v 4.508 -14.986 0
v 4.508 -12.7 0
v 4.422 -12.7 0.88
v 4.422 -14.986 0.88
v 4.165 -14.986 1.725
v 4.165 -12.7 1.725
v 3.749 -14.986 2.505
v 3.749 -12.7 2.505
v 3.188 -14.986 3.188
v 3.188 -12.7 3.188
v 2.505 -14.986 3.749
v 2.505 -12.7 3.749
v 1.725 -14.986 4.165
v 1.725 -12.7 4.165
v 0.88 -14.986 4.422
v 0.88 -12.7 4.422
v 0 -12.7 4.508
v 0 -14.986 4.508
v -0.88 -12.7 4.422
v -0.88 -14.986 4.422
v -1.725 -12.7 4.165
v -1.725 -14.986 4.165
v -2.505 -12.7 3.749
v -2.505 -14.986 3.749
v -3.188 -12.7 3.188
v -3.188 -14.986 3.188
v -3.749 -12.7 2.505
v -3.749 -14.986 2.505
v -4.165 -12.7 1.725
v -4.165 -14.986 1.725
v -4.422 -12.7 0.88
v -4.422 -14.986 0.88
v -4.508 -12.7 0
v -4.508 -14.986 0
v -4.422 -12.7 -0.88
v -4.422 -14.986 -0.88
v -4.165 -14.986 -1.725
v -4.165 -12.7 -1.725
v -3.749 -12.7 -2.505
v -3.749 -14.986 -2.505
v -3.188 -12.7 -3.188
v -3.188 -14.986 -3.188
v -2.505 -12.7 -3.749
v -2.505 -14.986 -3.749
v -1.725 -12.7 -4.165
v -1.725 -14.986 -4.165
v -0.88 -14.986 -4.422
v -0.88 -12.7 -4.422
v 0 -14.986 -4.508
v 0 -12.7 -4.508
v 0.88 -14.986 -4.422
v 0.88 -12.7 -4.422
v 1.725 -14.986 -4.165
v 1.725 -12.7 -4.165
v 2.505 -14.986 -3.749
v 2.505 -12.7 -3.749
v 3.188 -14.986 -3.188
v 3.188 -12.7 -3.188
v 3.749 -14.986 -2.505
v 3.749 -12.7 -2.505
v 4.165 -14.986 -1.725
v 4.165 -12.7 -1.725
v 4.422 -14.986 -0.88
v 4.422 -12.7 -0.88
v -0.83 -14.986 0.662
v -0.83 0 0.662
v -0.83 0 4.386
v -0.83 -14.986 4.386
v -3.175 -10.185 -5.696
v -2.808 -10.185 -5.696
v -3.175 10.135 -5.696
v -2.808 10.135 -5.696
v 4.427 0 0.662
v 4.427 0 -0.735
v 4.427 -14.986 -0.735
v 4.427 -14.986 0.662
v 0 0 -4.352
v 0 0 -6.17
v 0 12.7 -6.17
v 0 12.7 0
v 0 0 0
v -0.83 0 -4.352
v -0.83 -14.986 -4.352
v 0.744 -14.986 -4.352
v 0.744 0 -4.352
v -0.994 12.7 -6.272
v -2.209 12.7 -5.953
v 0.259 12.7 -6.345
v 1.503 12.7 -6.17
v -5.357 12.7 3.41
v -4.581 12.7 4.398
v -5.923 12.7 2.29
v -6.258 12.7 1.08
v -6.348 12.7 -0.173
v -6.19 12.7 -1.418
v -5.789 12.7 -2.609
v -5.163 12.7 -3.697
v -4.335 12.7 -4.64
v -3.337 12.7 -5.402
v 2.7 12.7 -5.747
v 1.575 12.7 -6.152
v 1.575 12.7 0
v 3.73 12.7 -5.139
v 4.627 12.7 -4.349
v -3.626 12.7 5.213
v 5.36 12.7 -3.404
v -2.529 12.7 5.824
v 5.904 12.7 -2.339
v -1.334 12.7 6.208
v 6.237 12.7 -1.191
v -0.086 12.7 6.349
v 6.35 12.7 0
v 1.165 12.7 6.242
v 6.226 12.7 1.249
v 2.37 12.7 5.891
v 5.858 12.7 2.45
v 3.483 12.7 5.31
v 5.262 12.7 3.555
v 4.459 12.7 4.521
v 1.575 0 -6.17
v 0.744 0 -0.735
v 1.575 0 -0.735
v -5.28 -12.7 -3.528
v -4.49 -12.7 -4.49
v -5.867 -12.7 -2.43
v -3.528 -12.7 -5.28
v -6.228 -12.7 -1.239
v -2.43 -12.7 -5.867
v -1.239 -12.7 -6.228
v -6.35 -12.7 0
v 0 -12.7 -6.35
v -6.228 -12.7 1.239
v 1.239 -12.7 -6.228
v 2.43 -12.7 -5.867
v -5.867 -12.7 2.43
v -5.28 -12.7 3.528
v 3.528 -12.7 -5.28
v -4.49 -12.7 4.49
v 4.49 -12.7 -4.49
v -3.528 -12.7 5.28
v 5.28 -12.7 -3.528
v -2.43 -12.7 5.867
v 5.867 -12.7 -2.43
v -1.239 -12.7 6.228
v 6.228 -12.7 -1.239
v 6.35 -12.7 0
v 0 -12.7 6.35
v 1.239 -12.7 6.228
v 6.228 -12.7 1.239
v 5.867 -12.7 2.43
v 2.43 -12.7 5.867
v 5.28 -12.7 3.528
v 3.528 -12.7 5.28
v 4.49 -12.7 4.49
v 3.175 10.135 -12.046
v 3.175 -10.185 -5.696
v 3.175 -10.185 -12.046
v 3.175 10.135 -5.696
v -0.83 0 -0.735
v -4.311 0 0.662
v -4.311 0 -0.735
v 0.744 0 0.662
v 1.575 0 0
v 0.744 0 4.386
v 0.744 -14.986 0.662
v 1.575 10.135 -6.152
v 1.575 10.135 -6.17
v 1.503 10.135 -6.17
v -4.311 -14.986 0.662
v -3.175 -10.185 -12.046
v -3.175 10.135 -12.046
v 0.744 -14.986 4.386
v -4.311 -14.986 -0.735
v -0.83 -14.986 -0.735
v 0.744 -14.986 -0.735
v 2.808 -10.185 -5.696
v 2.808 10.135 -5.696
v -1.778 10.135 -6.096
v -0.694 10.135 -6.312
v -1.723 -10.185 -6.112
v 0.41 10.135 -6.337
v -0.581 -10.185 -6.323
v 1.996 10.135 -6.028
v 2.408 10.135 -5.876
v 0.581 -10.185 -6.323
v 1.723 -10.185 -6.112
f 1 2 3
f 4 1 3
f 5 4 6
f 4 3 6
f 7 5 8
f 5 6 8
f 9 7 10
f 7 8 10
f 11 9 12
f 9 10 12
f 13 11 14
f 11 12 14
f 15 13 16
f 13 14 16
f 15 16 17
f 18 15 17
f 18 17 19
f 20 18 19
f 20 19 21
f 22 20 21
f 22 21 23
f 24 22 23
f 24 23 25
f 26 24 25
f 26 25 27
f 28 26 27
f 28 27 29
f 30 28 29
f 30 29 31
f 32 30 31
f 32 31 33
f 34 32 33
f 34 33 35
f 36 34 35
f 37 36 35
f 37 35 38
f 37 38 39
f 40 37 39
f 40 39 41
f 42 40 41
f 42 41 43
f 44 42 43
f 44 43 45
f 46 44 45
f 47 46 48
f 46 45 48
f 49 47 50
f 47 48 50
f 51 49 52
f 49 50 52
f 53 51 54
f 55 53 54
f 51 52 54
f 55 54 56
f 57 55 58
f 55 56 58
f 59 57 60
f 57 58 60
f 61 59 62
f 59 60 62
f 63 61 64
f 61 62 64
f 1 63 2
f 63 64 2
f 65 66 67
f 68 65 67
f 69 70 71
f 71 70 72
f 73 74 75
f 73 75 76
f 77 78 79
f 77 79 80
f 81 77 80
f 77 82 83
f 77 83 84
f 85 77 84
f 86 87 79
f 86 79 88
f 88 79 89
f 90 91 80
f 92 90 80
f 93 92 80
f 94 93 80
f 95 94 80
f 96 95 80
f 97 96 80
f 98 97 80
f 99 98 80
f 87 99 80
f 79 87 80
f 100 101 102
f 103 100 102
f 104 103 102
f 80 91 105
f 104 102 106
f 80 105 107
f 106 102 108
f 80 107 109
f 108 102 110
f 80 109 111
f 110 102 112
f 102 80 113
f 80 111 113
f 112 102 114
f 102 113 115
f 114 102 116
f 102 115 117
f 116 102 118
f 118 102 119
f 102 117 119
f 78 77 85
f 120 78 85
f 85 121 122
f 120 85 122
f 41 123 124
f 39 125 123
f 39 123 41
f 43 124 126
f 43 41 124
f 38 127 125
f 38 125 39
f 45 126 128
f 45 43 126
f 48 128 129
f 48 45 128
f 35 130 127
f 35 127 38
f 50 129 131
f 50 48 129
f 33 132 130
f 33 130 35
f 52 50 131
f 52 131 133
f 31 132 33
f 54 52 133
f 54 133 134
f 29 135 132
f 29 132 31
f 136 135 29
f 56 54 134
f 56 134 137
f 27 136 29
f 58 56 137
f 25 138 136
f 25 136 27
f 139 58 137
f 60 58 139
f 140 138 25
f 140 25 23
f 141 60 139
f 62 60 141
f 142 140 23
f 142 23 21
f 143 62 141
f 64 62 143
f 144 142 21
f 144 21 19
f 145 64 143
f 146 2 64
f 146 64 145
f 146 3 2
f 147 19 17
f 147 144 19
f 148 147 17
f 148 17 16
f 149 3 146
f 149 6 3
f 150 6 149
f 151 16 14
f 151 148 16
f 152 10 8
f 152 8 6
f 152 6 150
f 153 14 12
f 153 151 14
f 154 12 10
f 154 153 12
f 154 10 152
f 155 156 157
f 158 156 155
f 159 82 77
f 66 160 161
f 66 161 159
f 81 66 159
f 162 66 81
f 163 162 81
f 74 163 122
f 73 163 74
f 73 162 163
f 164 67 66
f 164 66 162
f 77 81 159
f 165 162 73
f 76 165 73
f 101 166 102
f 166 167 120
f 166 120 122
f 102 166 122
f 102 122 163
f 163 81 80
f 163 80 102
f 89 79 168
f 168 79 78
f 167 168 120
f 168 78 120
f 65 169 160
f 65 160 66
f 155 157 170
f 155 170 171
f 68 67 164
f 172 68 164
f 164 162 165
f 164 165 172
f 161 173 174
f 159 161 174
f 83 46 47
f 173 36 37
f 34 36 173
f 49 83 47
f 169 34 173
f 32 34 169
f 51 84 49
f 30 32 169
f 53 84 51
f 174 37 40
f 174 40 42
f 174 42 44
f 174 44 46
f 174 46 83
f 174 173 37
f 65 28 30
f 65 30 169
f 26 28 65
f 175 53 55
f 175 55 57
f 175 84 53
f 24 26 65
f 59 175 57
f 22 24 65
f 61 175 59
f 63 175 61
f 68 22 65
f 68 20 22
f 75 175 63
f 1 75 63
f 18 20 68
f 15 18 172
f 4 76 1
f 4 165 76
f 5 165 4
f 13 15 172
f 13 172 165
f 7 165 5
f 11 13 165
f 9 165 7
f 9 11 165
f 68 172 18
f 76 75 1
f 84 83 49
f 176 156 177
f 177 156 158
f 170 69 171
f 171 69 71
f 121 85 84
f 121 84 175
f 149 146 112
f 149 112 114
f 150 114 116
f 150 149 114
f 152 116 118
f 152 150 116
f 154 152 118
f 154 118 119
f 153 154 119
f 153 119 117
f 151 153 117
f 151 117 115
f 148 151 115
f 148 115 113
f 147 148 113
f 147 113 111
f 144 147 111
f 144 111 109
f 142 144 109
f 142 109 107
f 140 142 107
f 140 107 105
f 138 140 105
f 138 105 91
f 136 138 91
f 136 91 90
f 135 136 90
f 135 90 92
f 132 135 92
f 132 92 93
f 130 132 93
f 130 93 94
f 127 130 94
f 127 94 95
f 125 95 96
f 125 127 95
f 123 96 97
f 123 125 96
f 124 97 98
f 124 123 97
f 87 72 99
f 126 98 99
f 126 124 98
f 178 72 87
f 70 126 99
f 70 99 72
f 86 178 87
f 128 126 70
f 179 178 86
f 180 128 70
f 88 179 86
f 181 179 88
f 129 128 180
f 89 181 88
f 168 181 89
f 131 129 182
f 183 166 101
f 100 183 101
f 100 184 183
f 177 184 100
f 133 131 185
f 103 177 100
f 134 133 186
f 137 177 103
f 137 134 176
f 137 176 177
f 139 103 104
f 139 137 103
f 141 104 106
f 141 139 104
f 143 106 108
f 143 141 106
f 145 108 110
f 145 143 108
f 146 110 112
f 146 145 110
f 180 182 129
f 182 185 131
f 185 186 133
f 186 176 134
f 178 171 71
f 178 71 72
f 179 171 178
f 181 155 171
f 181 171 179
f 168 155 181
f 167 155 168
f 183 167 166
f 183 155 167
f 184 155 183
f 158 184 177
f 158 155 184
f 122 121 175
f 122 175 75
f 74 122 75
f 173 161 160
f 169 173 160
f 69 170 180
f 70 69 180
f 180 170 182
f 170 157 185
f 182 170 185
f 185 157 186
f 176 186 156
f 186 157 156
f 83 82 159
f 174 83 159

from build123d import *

# Parameters (mm, degrees)
F0_R      = 6.35
F1_DEPTH  = 12.7
F2_W      = 20.32
F2_H      = 6.35
F3_DEPTH  = 3.175
F4_W      = 1.5748
F4_H      = 6.169682
F5_DEPTH  = 40.132
F6_R      = 4.5085
F7_DEPTH  = 14.986
F8_W      = 8.7376
F8_H      = 1.397
F9_DEPTH  = 22.86
F10_W     = 1.5748
F10_H     = 8.7376
F11_DEPTH = 37.084


with BuildPart() as f1:
    # F0 (on Front) → F1 (new body, symmetric)
    with BuildSketch(Plane.XZ):
        Circle(F0_R)
    extrude(amount=F1_DEPTH, both=True)

    # F2 (on Right) → F3 (join, symmetric)
    with BuildSketch(Plane.YZ):
        with Locations((-0.024871, -8.870569)):
            Rectangle(F2_W, F2_H)
    extrude(amount=F3_DEPTH, both=True)

    # F4 (on Front) → F5 (cut)
    with BuildSketch(Plane.XZ):
        with Locations((0.7874, -3.084841)):
            Rectangle(F4_W, F4_H)
    extrude(amount=-F5_DEPTH, mode=Mode.SUBTRACT)

    # F6 (on Front) → F7 (join)
    with BuildSketch(Plane.XZ):
        Circle(F6_R)
    extrude(amount=F7_DEPTH)

    # F8 (on Front) → F9 (cut)
    with BuildSketch(Plane.XZ):
        with Locations((0.058195, -0.036068)):
            Rectangle(F8_W, F8_H)
    extrude(amount=F9_DEPTH, mode=Mode.SUBTRACT)

    # F10 (on Front) → F11 (cut)
    with BuildSketch(Plane.XZ):
        with Locations((-0.043064, 0.016989)):
            Rectangle(F10_W, F10_H)
    extrude(amount=F11_DEPTH, mode=Mode.SUBTRACT)


solid = f1.part
